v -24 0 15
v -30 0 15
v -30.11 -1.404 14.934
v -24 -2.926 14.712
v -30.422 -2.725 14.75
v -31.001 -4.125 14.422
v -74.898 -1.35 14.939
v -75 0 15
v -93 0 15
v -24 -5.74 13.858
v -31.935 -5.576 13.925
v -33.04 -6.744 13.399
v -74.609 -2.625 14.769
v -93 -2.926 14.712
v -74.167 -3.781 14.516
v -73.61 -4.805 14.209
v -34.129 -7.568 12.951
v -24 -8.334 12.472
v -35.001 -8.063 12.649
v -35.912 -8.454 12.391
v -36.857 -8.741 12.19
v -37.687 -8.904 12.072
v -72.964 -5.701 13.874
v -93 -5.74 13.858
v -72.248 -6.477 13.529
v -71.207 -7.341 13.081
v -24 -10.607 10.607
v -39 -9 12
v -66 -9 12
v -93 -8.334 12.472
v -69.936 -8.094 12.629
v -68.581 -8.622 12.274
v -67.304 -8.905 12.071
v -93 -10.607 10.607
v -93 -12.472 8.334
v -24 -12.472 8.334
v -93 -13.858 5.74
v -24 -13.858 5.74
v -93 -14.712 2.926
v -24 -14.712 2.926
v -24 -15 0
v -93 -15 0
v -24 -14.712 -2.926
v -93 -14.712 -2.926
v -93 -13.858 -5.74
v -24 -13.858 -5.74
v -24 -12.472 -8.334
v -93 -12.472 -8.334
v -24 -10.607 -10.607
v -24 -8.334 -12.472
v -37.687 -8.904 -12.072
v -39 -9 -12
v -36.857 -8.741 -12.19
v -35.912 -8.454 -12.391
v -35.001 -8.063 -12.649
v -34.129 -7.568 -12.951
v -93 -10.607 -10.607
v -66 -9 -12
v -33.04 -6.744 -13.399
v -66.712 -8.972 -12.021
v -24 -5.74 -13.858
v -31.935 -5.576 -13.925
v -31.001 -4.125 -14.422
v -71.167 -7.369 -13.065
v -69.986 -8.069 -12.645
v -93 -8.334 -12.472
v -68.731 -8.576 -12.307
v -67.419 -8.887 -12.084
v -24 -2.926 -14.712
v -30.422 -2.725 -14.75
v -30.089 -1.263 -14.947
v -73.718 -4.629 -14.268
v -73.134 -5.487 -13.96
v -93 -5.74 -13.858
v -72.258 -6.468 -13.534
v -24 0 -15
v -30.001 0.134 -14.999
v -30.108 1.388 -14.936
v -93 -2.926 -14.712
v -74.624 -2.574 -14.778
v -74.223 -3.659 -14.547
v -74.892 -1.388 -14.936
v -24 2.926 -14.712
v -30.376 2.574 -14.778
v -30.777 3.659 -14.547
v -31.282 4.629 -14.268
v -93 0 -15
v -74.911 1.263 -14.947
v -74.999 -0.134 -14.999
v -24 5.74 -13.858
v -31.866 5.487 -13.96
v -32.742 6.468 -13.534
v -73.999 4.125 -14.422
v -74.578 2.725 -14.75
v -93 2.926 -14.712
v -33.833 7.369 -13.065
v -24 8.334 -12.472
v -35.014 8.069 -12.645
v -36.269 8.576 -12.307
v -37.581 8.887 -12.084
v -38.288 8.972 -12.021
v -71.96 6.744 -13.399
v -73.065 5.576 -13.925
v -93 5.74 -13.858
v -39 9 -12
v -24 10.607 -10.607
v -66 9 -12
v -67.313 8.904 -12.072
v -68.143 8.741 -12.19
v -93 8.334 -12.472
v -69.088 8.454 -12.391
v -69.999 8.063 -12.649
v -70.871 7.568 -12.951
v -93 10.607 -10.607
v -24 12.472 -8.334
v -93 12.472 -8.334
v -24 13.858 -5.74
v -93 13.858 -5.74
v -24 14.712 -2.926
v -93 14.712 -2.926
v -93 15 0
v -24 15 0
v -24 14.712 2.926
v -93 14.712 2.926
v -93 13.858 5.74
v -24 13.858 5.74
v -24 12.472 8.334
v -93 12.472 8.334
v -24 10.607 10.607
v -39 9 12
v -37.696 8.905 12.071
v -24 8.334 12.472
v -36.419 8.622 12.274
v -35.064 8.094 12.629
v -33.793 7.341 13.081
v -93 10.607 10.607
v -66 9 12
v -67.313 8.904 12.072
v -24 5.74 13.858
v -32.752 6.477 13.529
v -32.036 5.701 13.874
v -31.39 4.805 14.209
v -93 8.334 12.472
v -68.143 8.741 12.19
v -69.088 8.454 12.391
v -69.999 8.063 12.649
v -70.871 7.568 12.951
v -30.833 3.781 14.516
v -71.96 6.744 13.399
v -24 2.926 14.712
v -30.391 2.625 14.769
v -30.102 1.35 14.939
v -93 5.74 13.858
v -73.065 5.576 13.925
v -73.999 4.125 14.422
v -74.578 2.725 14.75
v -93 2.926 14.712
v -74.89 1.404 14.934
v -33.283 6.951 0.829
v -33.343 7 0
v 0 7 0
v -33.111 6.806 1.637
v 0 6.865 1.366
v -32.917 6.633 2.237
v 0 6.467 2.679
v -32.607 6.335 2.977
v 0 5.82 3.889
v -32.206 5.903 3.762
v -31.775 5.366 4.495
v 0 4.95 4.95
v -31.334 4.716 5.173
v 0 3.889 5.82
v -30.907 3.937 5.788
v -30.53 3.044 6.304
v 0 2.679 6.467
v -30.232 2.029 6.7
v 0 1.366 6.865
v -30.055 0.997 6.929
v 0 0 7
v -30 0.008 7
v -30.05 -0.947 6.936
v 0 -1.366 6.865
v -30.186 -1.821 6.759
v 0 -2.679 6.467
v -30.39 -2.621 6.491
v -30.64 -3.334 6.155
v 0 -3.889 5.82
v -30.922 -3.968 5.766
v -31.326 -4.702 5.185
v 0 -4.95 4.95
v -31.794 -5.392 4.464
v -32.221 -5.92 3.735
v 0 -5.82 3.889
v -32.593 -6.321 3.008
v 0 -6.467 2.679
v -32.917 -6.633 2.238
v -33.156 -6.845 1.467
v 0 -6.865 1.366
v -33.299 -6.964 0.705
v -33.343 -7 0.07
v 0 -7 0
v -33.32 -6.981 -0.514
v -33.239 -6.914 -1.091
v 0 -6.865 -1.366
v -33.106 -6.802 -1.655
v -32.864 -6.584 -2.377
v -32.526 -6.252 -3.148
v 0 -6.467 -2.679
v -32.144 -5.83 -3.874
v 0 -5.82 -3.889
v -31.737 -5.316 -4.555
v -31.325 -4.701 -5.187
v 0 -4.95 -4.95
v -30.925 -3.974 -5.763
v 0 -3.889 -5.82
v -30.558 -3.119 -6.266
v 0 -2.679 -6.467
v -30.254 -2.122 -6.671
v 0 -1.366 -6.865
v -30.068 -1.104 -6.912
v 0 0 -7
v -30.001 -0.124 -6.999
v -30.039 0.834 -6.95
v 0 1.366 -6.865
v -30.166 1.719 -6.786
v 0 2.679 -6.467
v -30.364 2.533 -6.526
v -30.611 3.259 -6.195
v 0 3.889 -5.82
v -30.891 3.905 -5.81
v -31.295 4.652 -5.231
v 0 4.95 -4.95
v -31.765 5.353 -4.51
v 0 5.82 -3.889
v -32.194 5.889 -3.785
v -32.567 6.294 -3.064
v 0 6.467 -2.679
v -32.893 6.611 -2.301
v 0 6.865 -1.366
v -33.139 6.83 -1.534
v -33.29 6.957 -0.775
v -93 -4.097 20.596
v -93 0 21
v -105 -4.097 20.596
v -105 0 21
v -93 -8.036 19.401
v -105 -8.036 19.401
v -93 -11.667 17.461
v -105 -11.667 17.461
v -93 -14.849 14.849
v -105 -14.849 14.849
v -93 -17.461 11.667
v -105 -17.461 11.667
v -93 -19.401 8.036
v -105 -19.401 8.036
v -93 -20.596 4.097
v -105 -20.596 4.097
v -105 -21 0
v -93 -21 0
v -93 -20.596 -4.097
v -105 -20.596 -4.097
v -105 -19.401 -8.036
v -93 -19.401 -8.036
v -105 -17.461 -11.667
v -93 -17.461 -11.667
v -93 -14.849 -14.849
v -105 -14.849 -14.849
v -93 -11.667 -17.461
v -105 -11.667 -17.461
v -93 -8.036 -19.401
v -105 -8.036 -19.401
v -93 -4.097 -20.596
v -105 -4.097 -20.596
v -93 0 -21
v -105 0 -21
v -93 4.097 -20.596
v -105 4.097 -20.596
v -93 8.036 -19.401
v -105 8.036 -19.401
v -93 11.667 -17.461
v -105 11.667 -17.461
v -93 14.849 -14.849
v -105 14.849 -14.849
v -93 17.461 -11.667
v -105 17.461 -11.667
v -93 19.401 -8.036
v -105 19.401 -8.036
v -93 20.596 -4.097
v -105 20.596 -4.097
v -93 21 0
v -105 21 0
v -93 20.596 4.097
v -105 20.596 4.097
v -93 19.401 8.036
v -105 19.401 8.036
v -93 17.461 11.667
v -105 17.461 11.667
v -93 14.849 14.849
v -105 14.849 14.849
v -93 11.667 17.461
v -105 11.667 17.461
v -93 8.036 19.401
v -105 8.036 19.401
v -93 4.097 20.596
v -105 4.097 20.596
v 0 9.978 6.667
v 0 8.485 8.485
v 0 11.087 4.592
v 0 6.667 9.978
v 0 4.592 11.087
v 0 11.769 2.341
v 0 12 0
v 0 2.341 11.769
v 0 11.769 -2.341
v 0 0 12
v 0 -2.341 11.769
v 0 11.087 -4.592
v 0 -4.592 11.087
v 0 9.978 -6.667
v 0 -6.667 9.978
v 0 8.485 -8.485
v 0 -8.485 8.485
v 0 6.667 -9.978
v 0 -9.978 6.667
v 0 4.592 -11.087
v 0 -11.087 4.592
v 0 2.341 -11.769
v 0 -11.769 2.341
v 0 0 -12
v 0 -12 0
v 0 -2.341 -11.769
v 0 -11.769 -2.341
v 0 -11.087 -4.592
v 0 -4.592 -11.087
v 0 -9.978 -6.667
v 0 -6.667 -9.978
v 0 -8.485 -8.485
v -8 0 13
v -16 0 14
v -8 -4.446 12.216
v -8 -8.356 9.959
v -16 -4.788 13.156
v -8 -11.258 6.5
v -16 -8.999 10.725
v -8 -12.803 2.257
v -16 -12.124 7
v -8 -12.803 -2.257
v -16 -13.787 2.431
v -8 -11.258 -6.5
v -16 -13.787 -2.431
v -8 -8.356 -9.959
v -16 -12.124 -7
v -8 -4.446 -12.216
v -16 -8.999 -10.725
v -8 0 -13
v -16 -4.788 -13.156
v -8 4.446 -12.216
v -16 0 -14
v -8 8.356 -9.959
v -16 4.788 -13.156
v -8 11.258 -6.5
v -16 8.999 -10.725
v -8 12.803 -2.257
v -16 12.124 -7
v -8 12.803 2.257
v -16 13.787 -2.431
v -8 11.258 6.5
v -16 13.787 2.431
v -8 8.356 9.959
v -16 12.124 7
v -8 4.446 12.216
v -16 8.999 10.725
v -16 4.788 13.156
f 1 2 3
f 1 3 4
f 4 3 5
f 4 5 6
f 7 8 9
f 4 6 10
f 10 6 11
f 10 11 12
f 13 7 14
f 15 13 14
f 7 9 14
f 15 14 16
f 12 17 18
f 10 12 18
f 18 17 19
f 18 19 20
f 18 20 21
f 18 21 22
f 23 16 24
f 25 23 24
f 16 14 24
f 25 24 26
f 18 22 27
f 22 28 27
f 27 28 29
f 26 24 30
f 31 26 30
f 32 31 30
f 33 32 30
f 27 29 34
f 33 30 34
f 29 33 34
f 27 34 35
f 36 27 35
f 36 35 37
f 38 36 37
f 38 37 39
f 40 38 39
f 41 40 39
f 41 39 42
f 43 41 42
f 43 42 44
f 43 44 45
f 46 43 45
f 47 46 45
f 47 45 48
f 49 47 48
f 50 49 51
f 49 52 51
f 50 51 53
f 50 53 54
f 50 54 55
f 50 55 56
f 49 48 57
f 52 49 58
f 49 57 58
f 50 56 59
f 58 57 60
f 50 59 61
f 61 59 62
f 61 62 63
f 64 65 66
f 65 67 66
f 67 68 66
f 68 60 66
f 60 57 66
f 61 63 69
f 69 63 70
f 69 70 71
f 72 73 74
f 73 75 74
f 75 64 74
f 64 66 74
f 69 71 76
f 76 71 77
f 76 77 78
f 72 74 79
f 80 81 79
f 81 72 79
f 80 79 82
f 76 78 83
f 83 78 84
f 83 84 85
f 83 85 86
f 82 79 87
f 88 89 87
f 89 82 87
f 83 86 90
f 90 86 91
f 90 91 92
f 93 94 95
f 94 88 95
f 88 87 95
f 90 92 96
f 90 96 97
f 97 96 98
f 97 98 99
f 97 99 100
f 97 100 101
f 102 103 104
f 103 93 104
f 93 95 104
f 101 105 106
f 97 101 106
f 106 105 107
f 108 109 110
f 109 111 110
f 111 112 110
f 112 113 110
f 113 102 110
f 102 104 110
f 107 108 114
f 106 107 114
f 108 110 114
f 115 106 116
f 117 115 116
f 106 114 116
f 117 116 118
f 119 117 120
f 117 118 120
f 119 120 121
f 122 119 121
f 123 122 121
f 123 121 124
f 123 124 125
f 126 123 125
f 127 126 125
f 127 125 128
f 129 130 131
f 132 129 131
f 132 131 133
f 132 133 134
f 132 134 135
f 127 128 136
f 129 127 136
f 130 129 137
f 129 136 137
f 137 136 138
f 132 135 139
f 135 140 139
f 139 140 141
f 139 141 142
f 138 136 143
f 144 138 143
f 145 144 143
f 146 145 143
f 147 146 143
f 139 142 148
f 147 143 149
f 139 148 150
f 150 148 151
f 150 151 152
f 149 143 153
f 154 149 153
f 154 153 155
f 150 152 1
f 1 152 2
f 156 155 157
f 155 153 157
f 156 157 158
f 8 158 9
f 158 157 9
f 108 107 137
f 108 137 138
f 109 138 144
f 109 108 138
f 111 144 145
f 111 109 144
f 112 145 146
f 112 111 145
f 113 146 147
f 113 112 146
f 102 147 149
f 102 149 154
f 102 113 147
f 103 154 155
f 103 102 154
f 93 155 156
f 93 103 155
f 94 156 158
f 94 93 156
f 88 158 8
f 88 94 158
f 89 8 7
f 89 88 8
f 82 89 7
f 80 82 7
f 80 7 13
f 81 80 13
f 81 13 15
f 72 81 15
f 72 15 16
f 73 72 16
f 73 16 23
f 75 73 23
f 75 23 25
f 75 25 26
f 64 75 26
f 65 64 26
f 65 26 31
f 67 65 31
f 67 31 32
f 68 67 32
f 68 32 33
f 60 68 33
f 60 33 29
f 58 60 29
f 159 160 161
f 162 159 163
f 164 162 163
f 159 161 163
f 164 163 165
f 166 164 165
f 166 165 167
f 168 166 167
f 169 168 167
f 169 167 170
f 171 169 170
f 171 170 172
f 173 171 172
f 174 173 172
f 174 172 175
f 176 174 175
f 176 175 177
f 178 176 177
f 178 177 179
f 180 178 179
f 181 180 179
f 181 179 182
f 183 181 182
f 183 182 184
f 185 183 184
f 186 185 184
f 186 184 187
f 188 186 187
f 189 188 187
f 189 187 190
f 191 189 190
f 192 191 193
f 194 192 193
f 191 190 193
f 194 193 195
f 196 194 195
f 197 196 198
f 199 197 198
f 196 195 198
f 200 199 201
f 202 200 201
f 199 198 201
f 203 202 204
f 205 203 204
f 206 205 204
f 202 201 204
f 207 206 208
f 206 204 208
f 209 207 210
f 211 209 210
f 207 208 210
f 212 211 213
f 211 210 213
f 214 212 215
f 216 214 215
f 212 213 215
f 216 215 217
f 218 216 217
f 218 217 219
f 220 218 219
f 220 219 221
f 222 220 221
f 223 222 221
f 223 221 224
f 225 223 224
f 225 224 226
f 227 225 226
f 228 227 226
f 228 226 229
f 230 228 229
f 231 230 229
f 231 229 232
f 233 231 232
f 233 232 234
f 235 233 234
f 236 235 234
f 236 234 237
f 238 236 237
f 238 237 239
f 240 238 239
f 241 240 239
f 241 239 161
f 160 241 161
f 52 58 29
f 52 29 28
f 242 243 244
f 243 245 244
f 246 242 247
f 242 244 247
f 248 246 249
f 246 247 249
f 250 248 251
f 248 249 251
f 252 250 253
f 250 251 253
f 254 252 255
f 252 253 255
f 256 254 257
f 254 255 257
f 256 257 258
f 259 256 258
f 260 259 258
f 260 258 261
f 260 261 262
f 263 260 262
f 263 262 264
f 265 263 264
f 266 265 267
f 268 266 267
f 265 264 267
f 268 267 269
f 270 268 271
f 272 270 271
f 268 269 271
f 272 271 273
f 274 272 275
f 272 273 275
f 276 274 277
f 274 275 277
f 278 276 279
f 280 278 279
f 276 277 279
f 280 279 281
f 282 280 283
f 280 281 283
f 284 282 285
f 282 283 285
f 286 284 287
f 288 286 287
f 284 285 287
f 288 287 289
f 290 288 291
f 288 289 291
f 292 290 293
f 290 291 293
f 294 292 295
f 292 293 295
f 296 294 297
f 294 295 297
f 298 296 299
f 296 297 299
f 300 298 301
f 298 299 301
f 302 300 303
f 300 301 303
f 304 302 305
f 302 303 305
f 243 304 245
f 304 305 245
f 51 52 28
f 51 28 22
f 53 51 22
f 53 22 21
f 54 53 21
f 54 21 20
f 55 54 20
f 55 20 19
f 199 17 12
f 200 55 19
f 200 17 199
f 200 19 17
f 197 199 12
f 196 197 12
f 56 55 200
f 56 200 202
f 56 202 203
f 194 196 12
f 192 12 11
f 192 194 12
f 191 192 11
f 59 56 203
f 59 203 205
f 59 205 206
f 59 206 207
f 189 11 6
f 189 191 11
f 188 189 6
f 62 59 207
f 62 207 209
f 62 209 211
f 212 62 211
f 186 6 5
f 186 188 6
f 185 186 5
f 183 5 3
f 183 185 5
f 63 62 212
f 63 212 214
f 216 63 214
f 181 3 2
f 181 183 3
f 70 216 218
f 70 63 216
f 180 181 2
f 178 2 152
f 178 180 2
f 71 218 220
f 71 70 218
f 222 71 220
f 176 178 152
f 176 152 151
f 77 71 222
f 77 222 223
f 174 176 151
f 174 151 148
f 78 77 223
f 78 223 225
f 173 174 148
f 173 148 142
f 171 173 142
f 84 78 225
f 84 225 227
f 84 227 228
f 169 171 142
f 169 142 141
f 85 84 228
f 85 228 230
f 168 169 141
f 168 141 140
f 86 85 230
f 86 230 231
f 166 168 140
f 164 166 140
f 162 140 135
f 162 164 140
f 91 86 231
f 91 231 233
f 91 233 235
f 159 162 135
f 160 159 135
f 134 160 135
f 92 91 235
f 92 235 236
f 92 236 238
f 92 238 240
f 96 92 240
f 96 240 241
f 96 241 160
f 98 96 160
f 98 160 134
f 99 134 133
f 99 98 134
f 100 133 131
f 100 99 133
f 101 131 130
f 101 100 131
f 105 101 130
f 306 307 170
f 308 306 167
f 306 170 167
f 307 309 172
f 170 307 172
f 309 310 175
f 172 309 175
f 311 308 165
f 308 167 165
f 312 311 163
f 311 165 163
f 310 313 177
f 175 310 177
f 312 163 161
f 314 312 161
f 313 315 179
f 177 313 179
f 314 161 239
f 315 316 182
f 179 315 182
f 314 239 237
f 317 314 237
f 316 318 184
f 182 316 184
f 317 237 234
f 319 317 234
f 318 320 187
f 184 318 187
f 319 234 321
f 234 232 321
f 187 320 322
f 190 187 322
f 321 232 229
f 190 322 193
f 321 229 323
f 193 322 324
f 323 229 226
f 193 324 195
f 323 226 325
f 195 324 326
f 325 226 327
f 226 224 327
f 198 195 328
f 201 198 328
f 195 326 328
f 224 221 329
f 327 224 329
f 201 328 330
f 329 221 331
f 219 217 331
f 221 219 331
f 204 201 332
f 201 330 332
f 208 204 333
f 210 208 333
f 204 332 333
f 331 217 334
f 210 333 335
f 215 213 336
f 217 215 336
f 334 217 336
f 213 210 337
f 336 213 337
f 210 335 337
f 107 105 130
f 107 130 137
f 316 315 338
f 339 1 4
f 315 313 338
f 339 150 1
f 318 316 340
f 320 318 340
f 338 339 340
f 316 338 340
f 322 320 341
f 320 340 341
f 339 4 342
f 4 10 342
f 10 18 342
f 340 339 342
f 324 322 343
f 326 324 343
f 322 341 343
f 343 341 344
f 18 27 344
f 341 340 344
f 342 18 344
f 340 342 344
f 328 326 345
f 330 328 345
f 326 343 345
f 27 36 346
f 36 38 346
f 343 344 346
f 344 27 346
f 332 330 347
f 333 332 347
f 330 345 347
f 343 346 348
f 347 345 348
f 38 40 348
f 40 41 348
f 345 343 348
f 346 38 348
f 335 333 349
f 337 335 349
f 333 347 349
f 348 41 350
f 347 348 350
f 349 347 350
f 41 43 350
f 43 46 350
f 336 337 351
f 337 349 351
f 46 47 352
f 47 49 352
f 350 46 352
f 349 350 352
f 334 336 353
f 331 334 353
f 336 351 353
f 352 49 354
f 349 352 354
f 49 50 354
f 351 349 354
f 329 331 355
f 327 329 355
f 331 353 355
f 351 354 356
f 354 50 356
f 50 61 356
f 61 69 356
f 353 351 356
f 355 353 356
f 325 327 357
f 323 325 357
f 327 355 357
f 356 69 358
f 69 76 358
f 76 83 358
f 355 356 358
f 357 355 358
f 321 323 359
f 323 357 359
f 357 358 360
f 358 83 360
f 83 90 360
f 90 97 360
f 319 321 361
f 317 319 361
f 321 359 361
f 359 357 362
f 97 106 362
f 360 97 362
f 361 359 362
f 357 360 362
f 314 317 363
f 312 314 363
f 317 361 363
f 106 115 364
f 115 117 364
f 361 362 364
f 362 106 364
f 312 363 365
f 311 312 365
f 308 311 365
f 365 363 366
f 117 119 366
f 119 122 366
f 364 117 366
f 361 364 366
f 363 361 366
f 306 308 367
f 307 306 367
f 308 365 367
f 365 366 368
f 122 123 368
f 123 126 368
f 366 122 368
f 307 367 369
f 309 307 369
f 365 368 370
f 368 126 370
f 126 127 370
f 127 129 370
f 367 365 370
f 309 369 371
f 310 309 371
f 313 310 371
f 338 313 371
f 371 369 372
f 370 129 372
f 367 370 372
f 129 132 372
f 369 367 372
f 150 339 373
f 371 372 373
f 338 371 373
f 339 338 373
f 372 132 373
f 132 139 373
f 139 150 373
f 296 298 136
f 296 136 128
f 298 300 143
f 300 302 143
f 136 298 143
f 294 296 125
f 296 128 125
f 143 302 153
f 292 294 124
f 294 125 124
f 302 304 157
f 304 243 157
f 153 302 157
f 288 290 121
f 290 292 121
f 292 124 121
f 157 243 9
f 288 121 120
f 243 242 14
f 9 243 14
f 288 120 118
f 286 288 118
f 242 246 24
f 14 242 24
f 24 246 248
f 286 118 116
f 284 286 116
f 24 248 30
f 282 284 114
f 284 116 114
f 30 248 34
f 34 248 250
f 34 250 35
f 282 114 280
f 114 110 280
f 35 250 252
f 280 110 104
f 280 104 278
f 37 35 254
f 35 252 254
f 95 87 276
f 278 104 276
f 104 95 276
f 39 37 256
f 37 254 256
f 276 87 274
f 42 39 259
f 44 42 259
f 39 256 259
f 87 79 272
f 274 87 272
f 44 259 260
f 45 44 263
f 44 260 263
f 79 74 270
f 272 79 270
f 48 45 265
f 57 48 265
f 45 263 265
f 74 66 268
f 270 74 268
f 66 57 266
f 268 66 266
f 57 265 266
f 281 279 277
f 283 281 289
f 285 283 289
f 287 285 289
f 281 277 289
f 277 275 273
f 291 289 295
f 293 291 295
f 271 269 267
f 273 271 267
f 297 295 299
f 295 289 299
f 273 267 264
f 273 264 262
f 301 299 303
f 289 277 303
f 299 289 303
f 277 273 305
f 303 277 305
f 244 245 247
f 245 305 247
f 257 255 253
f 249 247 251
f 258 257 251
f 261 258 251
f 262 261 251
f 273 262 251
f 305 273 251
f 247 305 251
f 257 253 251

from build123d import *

# Parameters (mm, degrees)
F3_DEPTH      = 21.001
F3_DEPTH_BACK = 21.001
F4_R          = 7
F5_DEPTH      = 34.3431458505


with BuildPart() as f1:
    # F0 (on Front) → F1 (revolve)
    with BuildSketch(Plane.XZ):
        Polygon((-105, 21), (-105, 0), (0, 0), (0, 12), (-24, 15), (-93, 15), (-93, 21), align=None)
    revolve(axis=Axis((-52.5, 0, 0), (1, 0, 0)))

    # F2 (on Top) → F3 (cut, two sides)
    with BuildSketch(Plane.XY) as f3_sk:
        with BuildLine():
            ThreePointArc((-39, -9), (-30, 0), (-39, 9))
            Line((-39, 9), (-66, 9))
            ThreePointArc((-66, 9), (-75, 0), (-66, -9))
            Line((-66, -9), (-39, -9))
        make_face()
    extrude(amount=-F3_DEPTH, mode=Mode.SUBTRACT)
    extrude(f3_sk.sketch, amount=F3_DEPTH_BACK, mode=Mode.SUBTRACT)

    # F4 (on face) → F5 (cut, up to face)
    with BuildSketch(Plane.YZ):
        Circle(F4_R)
    extrude(amount=-F5_DEPTH, mode=Mode.SUBTRACT)


solid = f1.part
